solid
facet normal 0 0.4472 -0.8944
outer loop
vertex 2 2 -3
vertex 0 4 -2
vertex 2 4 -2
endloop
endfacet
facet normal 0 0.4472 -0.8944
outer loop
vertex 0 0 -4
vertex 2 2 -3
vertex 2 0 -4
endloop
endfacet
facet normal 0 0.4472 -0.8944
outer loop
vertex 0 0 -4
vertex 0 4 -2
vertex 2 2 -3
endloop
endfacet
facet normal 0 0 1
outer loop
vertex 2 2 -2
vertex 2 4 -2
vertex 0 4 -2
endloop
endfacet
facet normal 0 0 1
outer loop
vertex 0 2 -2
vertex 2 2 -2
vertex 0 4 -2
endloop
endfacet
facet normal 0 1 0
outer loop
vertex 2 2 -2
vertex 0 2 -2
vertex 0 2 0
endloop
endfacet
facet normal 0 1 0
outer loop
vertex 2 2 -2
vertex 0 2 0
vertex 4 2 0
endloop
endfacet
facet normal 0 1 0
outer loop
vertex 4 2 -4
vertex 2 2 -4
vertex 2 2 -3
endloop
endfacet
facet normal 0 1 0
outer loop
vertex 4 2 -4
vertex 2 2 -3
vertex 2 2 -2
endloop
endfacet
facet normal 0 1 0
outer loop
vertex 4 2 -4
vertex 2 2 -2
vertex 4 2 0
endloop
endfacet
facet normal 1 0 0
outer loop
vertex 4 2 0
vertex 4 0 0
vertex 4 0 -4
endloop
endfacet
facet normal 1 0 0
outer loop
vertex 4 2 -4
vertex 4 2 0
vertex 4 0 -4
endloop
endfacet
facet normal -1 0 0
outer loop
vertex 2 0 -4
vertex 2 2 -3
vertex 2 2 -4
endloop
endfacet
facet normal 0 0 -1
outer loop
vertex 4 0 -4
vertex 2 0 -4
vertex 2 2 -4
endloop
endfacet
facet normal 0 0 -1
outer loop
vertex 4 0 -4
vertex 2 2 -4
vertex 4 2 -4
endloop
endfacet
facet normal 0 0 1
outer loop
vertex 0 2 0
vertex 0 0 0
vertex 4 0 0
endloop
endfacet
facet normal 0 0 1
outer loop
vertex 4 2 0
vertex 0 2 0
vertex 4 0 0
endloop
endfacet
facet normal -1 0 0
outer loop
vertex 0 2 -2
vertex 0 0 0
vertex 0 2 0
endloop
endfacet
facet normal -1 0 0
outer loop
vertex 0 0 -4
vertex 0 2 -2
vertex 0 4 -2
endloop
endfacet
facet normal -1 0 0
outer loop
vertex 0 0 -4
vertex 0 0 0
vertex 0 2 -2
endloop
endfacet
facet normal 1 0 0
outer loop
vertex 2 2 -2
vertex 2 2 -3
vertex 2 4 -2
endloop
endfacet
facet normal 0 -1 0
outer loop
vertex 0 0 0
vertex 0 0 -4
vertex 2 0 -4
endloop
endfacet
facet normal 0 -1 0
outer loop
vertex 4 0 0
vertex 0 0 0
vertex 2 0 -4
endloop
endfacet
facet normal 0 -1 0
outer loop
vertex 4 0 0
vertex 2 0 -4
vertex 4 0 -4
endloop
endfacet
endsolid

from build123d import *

# Parameters (mm, degrees)
SKETCH1_W           = 4
SKETCH1_H           = 4
BOSS_EXTRUDE1_DEPTH = 4
CUT_EXTRUDE1_DEPTH  = 2
CUT_EXTRUDE2_DEPTH  = 2


with BuildPart() as part:
    # Sketch1 → Boss-Extrude1 (new body)
    with BuildSketch(Plane(origin=(0, 0, 0), x_dir=(1, 0, 0), z_dir=(0, 1, 0))):
        with Locations((2, 2)):
            Rectangle(SKETCH1_W, SKETCH1_H)
    extrude(amount=BOSS_EXTRUDE1_DEPTH)

    # Sketch2 → Cut-Extrude1 (cut)
    with BuildSketch(Plane(origin=(0, 4, 0), x_dir=(1, 0, 0), z_dir=(0, 1, 0))):
        Polygon((4, 4), (2, 4), (2, 2), (0, 2), (0, 0), (4, 0), align=None)
    extrude(amount=-CUT_EXTRUDE1_DEPTH, mode=Mode.SUBTRACT)

    # Sketch3 → Cut-Extrude2 (cut)
    with BuildSketch(Plane.ZY):
        Polygon((-2, 4), (-4, 0), (-4, 4), align=None)
    extrude(amount=-CUT_EXTRUDE2_DEPTH, mode=Mode.SUBTRACT)


solid = part.part
